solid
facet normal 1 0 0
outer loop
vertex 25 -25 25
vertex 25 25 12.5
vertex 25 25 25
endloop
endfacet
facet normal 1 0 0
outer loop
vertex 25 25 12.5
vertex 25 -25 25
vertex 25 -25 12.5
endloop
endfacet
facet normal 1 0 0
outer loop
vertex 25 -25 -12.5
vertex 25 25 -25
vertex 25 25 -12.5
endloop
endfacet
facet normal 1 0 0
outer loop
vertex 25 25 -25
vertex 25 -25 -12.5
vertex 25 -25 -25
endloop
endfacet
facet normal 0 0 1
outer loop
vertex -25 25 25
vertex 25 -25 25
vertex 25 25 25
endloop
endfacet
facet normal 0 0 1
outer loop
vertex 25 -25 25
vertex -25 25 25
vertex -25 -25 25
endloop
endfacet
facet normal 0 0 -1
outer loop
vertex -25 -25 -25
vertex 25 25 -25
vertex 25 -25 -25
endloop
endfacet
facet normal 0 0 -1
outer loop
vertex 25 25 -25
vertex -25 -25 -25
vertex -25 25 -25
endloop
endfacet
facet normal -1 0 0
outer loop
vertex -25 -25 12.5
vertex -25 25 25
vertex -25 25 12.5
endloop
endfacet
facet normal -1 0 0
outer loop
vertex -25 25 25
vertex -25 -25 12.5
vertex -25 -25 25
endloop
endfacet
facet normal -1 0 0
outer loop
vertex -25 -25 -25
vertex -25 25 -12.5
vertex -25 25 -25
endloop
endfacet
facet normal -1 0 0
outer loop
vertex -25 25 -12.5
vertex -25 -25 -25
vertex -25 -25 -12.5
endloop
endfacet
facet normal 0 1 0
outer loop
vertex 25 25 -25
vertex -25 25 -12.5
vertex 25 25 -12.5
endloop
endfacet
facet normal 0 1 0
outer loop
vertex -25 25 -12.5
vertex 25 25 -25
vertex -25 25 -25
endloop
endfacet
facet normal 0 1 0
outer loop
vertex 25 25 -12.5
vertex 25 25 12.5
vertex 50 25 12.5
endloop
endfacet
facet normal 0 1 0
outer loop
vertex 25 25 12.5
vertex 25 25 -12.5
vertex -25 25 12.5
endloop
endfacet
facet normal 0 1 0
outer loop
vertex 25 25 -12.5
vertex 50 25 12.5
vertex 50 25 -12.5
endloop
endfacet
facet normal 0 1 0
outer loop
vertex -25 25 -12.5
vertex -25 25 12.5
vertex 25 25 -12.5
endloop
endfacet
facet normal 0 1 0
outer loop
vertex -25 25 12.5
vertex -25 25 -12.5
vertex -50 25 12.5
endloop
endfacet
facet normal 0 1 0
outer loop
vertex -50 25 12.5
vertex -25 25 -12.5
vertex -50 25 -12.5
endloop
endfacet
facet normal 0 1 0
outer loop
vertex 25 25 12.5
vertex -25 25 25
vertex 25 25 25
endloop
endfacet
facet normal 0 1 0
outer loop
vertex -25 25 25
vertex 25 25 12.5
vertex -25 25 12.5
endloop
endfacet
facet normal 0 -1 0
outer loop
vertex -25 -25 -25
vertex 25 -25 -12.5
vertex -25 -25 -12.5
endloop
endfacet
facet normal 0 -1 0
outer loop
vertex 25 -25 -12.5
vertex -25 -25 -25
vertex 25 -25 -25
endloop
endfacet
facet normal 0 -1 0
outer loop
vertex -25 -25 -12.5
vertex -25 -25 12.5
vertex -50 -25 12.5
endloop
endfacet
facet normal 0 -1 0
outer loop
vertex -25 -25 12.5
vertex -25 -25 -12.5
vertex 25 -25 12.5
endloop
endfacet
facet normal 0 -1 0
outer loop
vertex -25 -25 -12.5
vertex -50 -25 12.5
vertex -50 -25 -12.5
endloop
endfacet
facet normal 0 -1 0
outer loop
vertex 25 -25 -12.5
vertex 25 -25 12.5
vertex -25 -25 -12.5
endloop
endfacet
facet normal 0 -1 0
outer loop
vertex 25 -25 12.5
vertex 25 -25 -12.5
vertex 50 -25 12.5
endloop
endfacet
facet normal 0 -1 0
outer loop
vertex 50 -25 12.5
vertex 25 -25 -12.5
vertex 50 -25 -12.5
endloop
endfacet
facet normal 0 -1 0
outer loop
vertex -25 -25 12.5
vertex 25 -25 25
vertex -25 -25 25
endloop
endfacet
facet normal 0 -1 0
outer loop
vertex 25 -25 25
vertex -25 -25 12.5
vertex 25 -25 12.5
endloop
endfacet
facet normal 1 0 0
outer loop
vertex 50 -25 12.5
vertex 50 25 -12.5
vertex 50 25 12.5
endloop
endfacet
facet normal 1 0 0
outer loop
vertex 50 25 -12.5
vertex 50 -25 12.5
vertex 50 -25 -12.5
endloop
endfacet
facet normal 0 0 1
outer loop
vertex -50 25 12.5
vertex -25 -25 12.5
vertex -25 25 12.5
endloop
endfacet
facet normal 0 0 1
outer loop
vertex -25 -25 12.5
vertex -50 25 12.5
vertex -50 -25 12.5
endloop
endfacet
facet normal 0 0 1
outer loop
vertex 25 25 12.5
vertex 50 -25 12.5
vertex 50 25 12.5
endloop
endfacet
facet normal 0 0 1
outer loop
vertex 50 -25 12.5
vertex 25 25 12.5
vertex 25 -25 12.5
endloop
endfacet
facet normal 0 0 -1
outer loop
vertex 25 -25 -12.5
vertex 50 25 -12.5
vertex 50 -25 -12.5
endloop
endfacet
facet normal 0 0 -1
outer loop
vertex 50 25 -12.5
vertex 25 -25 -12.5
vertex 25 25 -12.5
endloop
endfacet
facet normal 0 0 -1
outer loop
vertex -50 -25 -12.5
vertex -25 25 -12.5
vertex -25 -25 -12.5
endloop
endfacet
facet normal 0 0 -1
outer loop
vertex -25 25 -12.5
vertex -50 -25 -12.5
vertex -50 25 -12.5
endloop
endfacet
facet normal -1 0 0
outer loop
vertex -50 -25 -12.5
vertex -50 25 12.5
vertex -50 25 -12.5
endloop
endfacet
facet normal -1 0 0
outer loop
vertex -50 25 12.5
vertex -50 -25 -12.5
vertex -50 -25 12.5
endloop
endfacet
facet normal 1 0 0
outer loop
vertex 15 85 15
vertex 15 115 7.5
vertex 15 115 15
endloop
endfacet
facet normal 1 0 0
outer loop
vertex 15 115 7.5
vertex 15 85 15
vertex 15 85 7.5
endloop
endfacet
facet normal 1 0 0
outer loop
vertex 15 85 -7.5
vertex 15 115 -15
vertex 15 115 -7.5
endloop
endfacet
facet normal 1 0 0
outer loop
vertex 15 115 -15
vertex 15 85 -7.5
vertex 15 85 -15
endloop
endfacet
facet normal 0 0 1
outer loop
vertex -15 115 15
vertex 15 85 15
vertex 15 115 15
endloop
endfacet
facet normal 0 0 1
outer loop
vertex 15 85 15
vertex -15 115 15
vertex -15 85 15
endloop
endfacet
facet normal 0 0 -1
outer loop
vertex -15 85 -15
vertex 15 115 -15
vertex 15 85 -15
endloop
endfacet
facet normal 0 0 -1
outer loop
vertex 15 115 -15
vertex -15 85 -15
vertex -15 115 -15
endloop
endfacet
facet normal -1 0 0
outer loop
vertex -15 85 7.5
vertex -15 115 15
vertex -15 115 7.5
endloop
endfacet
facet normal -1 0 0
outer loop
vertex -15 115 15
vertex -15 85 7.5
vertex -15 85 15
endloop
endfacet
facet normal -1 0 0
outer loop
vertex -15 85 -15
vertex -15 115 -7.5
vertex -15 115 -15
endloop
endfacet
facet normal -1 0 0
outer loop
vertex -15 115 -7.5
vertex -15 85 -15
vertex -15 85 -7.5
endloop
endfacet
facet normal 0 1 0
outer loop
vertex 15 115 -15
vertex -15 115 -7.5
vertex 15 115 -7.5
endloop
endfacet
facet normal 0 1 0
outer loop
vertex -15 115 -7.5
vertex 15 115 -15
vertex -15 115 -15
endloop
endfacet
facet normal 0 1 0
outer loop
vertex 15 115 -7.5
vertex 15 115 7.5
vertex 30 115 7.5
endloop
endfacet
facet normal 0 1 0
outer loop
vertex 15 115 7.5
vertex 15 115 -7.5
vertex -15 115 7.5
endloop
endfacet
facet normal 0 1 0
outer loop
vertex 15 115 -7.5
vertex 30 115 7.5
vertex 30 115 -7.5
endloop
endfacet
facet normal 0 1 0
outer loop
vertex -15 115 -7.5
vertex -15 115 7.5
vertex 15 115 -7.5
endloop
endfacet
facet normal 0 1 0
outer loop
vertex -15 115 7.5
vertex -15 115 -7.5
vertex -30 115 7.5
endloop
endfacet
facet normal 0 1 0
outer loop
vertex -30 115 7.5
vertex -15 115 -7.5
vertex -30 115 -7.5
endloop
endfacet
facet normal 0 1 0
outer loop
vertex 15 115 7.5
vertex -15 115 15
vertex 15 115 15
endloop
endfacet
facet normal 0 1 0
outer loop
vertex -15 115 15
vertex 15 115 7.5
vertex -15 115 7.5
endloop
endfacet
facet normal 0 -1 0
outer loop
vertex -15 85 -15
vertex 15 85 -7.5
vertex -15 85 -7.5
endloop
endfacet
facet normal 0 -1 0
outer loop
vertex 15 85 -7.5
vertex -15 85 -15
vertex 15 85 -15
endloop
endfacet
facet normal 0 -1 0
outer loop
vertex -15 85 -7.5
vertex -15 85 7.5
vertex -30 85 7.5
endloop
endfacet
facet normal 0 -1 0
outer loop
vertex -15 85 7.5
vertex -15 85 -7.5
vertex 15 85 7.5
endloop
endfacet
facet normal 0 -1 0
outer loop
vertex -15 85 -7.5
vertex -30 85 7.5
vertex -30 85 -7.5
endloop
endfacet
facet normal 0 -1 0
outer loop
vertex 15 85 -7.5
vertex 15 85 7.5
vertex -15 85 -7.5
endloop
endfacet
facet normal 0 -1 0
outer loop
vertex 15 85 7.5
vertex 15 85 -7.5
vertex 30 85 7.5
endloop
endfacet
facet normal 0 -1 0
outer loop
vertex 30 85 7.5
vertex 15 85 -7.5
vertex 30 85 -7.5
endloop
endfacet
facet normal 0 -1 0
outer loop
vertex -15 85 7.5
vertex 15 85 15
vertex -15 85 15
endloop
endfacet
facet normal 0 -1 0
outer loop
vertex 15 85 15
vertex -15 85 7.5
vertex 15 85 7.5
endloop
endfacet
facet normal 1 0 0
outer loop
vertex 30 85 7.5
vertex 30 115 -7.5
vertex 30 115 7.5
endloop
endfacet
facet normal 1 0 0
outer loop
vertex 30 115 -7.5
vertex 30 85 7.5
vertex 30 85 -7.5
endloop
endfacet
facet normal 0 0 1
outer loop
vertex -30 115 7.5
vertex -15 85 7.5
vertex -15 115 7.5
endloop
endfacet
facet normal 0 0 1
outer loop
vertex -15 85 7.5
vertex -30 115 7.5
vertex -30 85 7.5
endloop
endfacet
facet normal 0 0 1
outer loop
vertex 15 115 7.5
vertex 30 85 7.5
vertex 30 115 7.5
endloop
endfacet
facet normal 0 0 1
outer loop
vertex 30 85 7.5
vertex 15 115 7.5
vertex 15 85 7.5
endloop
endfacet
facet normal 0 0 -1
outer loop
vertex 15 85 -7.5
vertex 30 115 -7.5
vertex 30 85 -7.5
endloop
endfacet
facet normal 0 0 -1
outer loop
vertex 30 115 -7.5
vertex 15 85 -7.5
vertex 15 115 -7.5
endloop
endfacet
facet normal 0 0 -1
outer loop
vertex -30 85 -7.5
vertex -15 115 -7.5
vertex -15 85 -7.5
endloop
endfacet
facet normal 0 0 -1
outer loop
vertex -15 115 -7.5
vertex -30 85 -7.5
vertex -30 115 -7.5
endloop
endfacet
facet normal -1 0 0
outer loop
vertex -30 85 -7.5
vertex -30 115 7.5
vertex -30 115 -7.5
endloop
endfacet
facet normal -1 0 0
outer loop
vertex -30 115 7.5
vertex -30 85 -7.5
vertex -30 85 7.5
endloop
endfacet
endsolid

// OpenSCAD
module Soporte(lado=50){
    cube([lado, lado, lado], center=true);
    cube([lado*2, lado, lado/2], center=true);
}


Soporte();

translate([0,100,0])
Soporte(lado=30);
